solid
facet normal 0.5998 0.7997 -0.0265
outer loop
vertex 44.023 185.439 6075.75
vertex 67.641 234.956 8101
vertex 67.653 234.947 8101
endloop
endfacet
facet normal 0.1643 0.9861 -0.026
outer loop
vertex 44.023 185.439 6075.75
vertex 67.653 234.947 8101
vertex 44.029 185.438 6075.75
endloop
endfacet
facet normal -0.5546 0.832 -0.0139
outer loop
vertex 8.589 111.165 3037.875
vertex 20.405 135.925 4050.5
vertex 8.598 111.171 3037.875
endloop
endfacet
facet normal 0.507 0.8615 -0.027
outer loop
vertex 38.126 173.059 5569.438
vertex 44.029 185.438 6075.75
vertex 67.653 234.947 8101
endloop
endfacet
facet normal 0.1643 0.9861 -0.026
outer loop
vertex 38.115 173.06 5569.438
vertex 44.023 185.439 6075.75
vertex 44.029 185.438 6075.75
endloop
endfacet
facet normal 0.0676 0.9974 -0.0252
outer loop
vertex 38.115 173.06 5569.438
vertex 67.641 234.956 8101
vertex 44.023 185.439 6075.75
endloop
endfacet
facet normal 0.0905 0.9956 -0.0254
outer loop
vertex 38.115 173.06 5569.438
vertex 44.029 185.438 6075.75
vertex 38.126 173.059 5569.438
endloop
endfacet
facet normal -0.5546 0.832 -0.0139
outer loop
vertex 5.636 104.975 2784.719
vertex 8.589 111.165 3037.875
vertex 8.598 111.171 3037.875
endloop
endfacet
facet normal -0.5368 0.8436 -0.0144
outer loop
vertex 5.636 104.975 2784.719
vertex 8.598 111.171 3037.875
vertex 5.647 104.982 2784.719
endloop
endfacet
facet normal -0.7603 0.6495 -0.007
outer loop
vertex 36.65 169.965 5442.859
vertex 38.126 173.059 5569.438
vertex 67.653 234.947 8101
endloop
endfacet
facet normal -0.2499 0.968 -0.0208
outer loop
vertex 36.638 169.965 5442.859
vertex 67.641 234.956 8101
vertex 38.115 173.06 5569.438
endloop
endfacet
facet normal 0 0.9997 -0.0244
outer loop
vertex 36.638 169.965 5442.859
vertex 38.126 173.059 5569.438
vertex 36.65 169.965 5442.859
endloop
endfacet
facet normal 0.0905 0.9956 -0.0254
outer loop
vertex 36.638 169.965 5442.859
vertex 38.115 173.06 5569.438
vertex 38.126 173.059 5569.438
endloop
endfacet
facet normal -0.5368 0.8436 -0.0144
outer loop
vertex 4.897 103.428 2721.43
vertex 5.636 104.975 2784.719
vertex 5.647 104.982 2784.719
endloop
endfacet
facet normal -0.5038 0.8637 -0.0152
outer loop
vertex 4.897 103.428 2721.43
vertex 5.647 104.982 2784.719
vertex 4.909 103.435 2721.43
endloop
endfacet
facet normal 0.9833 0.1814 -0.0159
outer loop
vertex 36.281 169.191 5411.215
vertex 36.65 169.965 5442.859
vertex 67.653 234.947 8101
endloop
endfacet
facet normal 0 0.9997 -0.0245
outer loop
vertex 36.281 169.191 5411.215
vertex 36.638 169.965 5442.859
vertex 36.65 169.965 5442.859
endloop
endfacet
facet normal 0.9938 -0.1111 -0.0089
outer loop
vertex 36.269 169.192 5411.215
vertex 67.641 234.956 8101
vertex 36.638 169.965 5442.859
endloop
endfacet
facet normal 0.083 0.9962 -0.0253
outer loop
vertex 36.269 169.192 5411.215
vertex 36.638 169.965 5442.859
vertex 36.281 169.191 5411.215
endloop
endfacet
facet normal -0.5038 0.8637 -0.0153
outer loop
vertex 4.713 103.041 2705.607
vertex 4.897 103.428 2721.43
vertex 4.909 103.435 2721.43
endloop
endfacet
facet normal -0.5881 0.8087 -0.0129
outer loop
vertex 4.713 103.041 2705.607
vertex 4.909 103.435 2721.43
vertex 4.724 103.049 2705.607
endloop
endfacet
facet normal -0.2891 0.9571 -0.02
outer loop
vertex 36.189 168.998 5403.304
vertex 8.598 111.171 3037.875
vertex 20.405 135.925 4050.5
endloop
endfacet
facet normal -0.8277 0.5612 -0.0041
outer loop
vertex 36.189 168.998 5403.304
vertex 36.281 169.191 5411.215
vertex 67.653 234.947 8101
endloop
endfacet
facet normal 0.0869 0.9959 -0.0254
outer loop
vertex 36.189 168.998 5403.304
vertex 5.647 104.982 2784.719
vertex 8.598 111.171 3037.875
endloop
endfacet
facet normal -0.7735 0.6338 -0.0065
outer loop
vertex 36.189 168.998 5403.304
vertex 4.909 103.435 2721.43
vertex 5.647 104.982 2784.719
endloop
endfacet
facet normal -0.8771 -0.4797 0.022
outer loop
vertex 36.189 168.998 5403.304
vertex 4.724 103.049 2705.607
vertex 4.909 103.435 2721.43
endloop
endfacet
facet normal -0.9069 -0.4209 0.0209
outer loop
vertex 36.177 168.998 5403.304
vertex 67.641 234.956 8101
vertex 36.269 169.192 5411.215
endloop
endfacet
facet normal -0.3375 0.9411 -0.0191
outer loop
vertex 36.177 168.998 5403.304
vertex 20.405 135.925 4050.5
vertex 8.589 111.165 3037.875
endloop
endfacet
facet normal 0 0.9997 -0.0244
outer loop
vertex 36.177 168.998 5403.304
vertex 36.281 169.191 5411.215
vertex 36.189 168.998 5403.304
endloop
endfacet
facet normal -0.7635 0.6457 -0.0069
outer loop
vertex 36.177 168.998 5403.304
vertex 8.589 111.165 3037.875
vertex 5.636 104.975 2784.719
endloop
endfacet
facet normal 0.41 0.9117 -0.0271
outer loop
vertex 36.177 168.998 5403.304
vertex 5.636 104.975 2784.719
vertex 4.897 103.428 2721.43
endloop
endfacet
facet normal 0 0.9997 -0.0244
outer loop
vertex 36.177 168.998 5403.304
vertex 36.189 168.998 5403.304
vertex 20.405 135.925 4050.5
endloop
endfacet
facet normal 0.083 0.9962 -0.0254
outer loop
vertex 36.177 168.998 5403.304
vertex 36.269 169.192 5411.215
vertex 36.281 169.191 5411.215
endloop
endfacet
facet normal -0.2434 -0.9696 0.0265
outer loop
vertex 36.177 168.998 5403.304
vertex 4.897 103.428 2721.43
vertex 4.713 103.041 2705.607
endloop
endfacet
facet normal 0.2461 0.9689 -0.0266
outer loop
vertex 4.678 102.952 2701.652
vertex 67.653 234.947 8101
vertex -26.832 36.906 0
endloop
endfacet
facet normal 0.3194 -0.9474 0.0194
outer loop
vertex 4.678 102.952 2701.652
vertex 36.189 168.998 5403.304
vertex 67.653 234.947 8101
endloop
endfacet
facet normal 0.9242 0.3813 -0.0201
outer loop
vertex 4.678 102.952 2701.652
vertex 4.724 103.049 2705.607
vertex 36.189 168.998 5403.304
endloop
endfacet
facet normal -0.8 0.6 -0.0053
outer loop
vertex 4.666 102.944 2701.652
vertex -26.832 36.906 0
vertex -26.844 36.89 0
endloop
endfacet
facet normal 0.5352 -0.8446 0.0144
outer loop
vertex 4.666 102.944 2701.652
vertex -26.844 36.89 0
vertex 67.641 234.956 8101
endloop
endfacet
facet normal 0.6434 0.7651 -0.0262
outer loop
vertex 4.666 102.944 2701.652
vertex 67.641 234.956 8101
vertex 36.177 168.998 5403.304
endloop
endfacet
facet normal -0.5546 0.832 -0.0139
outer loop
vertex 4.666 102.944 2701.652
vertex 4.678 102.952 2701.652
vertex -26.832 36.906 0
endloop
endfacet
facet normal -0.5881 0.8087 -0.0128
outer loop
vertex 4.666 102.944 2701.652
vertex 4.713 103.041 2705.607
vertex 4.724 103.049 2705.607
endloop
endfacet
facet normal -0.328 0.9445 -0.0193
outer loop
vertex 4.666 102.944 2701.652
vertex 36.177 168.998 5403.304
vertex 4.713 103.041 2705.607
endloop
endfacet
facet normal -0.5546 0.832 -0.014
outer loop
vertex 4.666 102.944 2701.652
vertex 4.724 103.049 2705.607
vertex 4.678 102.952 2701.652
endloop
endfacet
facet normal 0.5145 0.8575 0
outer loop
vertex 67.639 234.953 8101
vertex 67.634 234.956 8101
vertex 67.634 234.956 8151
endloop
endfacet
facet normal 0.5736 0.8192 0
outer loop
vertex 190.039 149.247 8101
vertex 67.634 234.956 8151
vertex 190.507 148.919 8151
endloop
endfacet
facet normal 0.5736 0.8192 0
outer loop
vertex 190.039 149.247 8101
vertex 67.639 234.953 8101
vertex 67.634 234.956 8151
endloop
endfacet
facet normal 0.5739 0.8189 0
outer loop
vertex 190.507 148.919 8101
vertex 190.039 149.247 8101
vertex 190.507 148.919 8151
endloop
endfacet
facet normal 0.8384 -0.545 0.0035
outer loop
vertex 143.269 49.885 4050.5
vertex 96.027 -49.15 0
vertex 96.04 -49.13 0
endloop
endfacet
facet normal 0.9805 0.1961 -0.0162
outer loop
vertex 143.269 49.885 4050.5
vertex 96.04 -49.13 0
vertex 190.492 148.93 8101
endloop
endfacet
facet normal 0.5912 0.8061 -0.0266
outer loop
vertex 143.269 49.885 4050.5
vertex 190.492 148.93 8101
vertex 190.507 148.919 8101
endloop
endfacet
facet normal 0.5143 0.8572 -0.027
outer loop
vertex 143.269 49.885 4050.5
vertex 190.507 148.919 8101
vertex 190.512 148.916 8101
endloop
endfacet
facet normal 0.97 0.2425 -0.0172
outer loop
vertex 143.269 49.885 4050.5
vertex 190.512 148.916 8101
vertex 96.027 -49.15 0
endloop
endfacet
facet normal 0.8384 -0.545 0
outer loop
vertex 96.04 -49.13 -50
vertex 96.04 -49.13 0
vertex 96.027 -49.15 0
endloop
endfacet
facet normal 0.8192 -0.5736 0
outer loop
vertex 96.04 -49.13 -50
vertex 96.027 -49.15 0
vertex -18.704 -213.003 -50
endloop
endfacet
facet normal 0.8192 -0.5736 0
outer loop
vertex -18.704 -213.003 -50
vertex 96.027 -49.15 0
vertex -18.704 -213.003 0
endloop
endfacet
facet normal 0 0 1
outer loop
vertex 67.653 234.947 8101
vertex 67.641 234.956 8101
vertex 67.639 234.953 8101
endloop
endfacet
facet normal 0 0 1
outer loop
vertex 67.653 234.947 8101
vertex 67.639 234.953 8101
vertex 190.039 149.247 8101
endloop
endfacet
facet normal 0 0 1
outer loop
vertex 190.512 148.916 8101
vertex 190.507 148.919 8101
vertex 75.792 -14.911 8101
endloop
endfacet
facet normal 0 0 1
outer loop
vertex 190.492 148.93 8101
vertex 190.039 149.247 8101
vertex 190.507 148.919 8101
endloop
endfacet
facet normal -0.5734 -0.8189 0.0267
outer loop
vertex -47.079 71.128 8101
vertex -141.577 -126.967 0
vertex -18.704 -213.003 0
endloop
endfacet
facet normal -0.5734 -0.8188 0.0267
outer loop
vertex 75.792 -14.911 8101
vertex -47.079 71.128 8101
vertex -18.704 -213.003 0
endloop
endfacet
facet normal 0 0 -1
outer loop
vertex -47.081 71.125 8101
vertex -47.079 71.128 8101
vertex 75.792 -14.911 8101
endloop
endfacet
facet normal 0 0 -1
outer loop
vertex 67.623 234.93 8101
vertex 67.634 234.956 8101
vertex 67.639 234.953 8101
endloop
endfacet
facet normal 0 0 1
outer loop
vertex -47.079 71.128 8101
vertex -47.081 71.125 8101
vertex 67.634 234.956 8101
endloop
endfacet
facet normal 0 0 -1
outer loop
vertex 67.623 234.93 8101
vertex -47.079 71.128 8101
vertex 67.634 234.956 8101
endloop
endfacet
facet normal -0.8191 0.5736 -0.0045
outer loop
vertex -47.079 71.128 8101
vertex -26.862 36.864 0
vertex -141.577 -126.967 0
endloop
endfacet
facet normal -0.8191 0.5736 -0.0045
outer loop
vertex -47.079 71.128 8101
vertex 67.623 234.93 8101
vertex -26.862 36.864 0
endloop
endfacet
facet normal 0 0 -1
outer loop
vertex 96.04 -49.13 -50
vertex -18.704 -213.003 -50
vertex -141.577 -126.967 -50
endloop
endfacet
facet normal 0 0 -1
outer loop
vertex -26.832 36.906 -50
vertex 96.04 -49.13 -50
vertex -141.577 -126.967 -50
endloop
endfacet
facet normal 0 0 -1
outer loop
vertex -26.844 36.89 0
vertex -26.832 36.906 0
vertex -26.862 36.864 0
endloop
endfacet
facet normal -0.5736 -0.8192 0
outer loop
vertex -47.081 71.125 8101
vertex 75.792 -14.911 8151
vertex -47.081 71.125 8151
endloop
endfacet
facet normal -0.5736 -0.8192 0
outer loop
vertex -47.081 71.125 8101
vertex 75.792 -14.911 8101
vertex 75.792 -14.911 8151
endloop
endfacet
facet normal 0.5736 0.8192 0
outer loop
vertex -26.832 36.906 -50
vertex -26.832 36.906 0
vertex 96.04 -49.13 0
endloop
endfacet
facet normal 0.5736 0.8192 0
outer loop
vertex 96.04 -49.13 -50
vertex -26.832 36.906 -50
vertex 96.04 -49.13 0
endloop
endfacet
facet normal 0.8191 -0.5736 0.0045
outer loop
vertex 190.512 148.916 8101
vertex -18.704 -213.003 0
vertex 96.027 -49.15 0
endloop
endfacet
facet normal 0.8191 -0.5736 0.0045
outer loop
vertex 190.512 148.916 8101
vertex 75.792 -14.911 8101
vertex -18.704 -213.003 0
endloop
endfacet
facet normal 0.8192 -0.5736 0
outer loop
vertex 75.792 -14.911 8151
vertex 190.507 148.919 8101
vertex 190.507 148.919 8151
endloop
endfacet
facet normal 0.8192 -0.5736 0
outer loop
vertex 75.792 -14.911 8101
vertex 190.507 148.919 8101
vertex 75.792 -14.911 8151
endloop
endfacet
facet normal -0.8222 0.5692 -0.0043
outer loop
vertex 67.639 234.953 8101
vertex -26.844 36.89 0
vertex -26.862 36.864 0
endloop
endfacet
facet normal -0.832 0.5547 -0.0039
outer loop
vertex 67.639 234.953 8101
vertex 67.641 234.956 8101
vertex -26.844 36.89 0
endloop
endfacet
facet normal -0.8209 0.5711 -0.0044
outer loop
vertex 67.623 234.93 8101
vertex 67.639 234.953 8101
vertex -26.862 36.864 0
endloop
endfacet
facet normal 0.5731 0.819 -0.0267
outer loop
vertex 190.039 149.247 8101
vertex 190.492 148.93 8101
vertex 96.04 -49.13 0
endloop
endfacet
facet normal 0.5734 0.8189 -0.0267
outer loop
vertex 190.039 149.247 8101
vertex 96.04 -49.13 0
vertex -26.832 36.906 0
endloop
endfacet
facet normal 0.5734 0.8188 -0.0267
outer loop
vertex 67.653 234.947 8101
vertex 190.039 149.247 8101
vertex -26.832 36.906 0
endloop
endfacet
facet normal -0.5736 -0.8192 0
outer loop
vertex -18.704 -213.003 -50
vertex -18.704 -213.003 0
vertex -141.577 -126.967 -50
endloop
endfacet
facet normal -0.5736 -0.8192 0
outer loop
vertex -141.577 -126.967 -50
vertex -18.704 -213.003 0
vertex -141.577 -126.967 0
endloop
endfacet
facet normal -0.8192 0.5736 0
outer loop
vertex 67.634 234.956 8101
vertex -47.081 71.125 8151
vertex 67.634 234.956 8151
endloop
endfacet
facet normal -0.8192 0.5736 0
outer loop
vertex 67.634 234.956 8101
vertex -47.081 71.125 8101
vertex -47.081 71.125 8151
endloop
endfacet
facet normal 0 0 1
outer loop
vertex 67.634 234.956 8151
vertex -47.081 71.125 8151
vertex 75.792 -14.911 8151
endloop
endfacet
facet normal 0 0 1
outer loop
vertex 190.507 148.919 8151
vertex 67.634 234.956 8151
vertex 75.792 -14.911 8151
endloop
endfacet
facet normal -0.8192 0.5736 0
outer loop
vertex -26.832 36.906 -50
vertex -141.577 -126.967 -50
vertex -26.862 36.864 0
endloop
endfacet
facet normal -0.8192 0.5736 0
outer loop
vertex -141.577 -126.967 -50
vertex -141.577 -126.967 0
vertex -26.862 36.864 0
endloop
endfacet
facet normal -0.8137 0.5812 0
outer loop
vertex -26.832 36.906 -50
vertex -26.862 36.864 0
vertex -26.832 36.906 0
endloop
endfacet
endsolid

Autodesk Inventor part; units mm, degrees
ref_plane "YZ Plane" through (0, 0, 0) normal (1, 0, 0) x (0, 1, 0)
ref_plane "XZ Plane" through (0, 0, 0) normal (0, 1, 0) x (-1, 0, 0)
sketch "Sketch1" plane through (0, 0, 0) normal (0, 0, 1) x (1, 0, 0)
  line L0 (-26.862, 36.8638) -> (-141.5773, -126.9666)
  line L1 (96.5672, -49.5284) -> (-26.3079, 36.5048)
  line L2 (-141.5773, -126.9666) -> (-18.7045, -213.0031) construction
  line L3 (-18.1437, -213.3618) -> (96.5672, -49.5284)
  line L4 (96.0404, -49.1304) -> (-18.7045, -213.0031)
  line L5 (-18.7045, -213.0031) -> (-141.5773, -126.9666)
  line L6 (-141.5773, -126.9666) -> (-26.8324, 36.9061)
  line L7 (-26.8324, 36.9061) -> (96.0404, -49.1304)
  line L8 (96.0404, -49.1304) -> (-141.5773, -126.9666) construction
  line L9 (-18.7045, -213.0031) -> (-26.8324, 36.9061) construction
  point P0 (0, 0)
  point P1 (-22.7685, -88.0485)
ref_plane "Work Plane2" through (0, 0, 8101) normal (0, 0, 1) x (1, 0, 0)
ref_plane "Work Plane1" through (0, 0, 0) normal (0, 0, 1) x (1, 0, 0)
sketch "Sketch2" plane through (0, 0, 8101) normal (0, 0, 1) x (1, 0, 0)
  line L0 (190.5115, 148.9161) -> (67.641, 234.9559) construction
  line L1 (67.641, 234.9559) -> (-47.0787, 71.1285) construction
  line L2 (75.7918, -14.9112) -> (190.5115, 148.9161) construction
  line L3 (-47.0787, 71.1285) -> (75.7918, -14.9112) construction
  line L4 (190.5115, 148.9161) -> (75.7918, -14.9112)
  line L5 (75.7918, -14.9112) -> (-47.0787, 71.1285)
  line L6 (-47.0787, 71.1285) -> (67.641, 234.9559)
  line L7 (67.641, 234.9559) -> (190.5115, 148.9161)
  line L8 (190.5115, 148.9161) -> (-47.0787, 71.1285) construction
  line L9 (75.7918, -14.9112) -> (67.641, 234.9559) construction
  point P0 (0, 0)
  point P1 (71.7164, 110.0223)
loft "Loft1" add profiles "Sketch1", "Sketch2"
sketch "Sketch3" plane through (-18.7045, -213.0031, 0) normal (0, 0, -1) x (-0.8192, 0.5736, 0)
  line L0 (0, 200.0516) -> (0, 0) projected
  line L1 (0, 0) -> (150, 0) projected
  line L2 (150, 0) -> (150, 200.0516) projected
  line L3 (150, 200.0516) -> (0, 200.0516) projected
  point P0 (106.8517, 185.2104)
sketch "Sketch4" plane through (75.7918, -14.9112, 8101) normal (0, 0, 1) x (0.8191, -0.5736, 0)
  line L0 (0, 200) -> (0, 0) construction
  line L1 (-150, 200) -> (0, 200) construction
  line L2 (-150, 0) -> (-150, 200) construction
  line L3 (0, 0) -> (-150, 0) construction
  point P0 (-70.6369, -31.2597)
extrude "Extrusion1" add sketch "Sketch3" along normal blind 50
sketch "Sketch5" plane through (75.7918, -14.9112, 8101) normal (0, 0, 1) x (0.8191, -0.5736, 0)
  line L0 (-150, 0) -> (-150, 200) projected
  line L1 (0, 0) -> (-150, 0) projected
  line L2 (-150, 200) -> (0, 200)
  line L3 (0, 200) -> (0, 0)
  line L4 (0, 0) -> (-150, 0)
  line L5 (-150, 0) -> (-150, 200)
  point P0 (-70.6369, -31.2597)
extrude "Extrusion2" add sketch "Sketch5" along normal blind 50
properties part number "support_beam_segment_0106" material "Wood (Maple)"
